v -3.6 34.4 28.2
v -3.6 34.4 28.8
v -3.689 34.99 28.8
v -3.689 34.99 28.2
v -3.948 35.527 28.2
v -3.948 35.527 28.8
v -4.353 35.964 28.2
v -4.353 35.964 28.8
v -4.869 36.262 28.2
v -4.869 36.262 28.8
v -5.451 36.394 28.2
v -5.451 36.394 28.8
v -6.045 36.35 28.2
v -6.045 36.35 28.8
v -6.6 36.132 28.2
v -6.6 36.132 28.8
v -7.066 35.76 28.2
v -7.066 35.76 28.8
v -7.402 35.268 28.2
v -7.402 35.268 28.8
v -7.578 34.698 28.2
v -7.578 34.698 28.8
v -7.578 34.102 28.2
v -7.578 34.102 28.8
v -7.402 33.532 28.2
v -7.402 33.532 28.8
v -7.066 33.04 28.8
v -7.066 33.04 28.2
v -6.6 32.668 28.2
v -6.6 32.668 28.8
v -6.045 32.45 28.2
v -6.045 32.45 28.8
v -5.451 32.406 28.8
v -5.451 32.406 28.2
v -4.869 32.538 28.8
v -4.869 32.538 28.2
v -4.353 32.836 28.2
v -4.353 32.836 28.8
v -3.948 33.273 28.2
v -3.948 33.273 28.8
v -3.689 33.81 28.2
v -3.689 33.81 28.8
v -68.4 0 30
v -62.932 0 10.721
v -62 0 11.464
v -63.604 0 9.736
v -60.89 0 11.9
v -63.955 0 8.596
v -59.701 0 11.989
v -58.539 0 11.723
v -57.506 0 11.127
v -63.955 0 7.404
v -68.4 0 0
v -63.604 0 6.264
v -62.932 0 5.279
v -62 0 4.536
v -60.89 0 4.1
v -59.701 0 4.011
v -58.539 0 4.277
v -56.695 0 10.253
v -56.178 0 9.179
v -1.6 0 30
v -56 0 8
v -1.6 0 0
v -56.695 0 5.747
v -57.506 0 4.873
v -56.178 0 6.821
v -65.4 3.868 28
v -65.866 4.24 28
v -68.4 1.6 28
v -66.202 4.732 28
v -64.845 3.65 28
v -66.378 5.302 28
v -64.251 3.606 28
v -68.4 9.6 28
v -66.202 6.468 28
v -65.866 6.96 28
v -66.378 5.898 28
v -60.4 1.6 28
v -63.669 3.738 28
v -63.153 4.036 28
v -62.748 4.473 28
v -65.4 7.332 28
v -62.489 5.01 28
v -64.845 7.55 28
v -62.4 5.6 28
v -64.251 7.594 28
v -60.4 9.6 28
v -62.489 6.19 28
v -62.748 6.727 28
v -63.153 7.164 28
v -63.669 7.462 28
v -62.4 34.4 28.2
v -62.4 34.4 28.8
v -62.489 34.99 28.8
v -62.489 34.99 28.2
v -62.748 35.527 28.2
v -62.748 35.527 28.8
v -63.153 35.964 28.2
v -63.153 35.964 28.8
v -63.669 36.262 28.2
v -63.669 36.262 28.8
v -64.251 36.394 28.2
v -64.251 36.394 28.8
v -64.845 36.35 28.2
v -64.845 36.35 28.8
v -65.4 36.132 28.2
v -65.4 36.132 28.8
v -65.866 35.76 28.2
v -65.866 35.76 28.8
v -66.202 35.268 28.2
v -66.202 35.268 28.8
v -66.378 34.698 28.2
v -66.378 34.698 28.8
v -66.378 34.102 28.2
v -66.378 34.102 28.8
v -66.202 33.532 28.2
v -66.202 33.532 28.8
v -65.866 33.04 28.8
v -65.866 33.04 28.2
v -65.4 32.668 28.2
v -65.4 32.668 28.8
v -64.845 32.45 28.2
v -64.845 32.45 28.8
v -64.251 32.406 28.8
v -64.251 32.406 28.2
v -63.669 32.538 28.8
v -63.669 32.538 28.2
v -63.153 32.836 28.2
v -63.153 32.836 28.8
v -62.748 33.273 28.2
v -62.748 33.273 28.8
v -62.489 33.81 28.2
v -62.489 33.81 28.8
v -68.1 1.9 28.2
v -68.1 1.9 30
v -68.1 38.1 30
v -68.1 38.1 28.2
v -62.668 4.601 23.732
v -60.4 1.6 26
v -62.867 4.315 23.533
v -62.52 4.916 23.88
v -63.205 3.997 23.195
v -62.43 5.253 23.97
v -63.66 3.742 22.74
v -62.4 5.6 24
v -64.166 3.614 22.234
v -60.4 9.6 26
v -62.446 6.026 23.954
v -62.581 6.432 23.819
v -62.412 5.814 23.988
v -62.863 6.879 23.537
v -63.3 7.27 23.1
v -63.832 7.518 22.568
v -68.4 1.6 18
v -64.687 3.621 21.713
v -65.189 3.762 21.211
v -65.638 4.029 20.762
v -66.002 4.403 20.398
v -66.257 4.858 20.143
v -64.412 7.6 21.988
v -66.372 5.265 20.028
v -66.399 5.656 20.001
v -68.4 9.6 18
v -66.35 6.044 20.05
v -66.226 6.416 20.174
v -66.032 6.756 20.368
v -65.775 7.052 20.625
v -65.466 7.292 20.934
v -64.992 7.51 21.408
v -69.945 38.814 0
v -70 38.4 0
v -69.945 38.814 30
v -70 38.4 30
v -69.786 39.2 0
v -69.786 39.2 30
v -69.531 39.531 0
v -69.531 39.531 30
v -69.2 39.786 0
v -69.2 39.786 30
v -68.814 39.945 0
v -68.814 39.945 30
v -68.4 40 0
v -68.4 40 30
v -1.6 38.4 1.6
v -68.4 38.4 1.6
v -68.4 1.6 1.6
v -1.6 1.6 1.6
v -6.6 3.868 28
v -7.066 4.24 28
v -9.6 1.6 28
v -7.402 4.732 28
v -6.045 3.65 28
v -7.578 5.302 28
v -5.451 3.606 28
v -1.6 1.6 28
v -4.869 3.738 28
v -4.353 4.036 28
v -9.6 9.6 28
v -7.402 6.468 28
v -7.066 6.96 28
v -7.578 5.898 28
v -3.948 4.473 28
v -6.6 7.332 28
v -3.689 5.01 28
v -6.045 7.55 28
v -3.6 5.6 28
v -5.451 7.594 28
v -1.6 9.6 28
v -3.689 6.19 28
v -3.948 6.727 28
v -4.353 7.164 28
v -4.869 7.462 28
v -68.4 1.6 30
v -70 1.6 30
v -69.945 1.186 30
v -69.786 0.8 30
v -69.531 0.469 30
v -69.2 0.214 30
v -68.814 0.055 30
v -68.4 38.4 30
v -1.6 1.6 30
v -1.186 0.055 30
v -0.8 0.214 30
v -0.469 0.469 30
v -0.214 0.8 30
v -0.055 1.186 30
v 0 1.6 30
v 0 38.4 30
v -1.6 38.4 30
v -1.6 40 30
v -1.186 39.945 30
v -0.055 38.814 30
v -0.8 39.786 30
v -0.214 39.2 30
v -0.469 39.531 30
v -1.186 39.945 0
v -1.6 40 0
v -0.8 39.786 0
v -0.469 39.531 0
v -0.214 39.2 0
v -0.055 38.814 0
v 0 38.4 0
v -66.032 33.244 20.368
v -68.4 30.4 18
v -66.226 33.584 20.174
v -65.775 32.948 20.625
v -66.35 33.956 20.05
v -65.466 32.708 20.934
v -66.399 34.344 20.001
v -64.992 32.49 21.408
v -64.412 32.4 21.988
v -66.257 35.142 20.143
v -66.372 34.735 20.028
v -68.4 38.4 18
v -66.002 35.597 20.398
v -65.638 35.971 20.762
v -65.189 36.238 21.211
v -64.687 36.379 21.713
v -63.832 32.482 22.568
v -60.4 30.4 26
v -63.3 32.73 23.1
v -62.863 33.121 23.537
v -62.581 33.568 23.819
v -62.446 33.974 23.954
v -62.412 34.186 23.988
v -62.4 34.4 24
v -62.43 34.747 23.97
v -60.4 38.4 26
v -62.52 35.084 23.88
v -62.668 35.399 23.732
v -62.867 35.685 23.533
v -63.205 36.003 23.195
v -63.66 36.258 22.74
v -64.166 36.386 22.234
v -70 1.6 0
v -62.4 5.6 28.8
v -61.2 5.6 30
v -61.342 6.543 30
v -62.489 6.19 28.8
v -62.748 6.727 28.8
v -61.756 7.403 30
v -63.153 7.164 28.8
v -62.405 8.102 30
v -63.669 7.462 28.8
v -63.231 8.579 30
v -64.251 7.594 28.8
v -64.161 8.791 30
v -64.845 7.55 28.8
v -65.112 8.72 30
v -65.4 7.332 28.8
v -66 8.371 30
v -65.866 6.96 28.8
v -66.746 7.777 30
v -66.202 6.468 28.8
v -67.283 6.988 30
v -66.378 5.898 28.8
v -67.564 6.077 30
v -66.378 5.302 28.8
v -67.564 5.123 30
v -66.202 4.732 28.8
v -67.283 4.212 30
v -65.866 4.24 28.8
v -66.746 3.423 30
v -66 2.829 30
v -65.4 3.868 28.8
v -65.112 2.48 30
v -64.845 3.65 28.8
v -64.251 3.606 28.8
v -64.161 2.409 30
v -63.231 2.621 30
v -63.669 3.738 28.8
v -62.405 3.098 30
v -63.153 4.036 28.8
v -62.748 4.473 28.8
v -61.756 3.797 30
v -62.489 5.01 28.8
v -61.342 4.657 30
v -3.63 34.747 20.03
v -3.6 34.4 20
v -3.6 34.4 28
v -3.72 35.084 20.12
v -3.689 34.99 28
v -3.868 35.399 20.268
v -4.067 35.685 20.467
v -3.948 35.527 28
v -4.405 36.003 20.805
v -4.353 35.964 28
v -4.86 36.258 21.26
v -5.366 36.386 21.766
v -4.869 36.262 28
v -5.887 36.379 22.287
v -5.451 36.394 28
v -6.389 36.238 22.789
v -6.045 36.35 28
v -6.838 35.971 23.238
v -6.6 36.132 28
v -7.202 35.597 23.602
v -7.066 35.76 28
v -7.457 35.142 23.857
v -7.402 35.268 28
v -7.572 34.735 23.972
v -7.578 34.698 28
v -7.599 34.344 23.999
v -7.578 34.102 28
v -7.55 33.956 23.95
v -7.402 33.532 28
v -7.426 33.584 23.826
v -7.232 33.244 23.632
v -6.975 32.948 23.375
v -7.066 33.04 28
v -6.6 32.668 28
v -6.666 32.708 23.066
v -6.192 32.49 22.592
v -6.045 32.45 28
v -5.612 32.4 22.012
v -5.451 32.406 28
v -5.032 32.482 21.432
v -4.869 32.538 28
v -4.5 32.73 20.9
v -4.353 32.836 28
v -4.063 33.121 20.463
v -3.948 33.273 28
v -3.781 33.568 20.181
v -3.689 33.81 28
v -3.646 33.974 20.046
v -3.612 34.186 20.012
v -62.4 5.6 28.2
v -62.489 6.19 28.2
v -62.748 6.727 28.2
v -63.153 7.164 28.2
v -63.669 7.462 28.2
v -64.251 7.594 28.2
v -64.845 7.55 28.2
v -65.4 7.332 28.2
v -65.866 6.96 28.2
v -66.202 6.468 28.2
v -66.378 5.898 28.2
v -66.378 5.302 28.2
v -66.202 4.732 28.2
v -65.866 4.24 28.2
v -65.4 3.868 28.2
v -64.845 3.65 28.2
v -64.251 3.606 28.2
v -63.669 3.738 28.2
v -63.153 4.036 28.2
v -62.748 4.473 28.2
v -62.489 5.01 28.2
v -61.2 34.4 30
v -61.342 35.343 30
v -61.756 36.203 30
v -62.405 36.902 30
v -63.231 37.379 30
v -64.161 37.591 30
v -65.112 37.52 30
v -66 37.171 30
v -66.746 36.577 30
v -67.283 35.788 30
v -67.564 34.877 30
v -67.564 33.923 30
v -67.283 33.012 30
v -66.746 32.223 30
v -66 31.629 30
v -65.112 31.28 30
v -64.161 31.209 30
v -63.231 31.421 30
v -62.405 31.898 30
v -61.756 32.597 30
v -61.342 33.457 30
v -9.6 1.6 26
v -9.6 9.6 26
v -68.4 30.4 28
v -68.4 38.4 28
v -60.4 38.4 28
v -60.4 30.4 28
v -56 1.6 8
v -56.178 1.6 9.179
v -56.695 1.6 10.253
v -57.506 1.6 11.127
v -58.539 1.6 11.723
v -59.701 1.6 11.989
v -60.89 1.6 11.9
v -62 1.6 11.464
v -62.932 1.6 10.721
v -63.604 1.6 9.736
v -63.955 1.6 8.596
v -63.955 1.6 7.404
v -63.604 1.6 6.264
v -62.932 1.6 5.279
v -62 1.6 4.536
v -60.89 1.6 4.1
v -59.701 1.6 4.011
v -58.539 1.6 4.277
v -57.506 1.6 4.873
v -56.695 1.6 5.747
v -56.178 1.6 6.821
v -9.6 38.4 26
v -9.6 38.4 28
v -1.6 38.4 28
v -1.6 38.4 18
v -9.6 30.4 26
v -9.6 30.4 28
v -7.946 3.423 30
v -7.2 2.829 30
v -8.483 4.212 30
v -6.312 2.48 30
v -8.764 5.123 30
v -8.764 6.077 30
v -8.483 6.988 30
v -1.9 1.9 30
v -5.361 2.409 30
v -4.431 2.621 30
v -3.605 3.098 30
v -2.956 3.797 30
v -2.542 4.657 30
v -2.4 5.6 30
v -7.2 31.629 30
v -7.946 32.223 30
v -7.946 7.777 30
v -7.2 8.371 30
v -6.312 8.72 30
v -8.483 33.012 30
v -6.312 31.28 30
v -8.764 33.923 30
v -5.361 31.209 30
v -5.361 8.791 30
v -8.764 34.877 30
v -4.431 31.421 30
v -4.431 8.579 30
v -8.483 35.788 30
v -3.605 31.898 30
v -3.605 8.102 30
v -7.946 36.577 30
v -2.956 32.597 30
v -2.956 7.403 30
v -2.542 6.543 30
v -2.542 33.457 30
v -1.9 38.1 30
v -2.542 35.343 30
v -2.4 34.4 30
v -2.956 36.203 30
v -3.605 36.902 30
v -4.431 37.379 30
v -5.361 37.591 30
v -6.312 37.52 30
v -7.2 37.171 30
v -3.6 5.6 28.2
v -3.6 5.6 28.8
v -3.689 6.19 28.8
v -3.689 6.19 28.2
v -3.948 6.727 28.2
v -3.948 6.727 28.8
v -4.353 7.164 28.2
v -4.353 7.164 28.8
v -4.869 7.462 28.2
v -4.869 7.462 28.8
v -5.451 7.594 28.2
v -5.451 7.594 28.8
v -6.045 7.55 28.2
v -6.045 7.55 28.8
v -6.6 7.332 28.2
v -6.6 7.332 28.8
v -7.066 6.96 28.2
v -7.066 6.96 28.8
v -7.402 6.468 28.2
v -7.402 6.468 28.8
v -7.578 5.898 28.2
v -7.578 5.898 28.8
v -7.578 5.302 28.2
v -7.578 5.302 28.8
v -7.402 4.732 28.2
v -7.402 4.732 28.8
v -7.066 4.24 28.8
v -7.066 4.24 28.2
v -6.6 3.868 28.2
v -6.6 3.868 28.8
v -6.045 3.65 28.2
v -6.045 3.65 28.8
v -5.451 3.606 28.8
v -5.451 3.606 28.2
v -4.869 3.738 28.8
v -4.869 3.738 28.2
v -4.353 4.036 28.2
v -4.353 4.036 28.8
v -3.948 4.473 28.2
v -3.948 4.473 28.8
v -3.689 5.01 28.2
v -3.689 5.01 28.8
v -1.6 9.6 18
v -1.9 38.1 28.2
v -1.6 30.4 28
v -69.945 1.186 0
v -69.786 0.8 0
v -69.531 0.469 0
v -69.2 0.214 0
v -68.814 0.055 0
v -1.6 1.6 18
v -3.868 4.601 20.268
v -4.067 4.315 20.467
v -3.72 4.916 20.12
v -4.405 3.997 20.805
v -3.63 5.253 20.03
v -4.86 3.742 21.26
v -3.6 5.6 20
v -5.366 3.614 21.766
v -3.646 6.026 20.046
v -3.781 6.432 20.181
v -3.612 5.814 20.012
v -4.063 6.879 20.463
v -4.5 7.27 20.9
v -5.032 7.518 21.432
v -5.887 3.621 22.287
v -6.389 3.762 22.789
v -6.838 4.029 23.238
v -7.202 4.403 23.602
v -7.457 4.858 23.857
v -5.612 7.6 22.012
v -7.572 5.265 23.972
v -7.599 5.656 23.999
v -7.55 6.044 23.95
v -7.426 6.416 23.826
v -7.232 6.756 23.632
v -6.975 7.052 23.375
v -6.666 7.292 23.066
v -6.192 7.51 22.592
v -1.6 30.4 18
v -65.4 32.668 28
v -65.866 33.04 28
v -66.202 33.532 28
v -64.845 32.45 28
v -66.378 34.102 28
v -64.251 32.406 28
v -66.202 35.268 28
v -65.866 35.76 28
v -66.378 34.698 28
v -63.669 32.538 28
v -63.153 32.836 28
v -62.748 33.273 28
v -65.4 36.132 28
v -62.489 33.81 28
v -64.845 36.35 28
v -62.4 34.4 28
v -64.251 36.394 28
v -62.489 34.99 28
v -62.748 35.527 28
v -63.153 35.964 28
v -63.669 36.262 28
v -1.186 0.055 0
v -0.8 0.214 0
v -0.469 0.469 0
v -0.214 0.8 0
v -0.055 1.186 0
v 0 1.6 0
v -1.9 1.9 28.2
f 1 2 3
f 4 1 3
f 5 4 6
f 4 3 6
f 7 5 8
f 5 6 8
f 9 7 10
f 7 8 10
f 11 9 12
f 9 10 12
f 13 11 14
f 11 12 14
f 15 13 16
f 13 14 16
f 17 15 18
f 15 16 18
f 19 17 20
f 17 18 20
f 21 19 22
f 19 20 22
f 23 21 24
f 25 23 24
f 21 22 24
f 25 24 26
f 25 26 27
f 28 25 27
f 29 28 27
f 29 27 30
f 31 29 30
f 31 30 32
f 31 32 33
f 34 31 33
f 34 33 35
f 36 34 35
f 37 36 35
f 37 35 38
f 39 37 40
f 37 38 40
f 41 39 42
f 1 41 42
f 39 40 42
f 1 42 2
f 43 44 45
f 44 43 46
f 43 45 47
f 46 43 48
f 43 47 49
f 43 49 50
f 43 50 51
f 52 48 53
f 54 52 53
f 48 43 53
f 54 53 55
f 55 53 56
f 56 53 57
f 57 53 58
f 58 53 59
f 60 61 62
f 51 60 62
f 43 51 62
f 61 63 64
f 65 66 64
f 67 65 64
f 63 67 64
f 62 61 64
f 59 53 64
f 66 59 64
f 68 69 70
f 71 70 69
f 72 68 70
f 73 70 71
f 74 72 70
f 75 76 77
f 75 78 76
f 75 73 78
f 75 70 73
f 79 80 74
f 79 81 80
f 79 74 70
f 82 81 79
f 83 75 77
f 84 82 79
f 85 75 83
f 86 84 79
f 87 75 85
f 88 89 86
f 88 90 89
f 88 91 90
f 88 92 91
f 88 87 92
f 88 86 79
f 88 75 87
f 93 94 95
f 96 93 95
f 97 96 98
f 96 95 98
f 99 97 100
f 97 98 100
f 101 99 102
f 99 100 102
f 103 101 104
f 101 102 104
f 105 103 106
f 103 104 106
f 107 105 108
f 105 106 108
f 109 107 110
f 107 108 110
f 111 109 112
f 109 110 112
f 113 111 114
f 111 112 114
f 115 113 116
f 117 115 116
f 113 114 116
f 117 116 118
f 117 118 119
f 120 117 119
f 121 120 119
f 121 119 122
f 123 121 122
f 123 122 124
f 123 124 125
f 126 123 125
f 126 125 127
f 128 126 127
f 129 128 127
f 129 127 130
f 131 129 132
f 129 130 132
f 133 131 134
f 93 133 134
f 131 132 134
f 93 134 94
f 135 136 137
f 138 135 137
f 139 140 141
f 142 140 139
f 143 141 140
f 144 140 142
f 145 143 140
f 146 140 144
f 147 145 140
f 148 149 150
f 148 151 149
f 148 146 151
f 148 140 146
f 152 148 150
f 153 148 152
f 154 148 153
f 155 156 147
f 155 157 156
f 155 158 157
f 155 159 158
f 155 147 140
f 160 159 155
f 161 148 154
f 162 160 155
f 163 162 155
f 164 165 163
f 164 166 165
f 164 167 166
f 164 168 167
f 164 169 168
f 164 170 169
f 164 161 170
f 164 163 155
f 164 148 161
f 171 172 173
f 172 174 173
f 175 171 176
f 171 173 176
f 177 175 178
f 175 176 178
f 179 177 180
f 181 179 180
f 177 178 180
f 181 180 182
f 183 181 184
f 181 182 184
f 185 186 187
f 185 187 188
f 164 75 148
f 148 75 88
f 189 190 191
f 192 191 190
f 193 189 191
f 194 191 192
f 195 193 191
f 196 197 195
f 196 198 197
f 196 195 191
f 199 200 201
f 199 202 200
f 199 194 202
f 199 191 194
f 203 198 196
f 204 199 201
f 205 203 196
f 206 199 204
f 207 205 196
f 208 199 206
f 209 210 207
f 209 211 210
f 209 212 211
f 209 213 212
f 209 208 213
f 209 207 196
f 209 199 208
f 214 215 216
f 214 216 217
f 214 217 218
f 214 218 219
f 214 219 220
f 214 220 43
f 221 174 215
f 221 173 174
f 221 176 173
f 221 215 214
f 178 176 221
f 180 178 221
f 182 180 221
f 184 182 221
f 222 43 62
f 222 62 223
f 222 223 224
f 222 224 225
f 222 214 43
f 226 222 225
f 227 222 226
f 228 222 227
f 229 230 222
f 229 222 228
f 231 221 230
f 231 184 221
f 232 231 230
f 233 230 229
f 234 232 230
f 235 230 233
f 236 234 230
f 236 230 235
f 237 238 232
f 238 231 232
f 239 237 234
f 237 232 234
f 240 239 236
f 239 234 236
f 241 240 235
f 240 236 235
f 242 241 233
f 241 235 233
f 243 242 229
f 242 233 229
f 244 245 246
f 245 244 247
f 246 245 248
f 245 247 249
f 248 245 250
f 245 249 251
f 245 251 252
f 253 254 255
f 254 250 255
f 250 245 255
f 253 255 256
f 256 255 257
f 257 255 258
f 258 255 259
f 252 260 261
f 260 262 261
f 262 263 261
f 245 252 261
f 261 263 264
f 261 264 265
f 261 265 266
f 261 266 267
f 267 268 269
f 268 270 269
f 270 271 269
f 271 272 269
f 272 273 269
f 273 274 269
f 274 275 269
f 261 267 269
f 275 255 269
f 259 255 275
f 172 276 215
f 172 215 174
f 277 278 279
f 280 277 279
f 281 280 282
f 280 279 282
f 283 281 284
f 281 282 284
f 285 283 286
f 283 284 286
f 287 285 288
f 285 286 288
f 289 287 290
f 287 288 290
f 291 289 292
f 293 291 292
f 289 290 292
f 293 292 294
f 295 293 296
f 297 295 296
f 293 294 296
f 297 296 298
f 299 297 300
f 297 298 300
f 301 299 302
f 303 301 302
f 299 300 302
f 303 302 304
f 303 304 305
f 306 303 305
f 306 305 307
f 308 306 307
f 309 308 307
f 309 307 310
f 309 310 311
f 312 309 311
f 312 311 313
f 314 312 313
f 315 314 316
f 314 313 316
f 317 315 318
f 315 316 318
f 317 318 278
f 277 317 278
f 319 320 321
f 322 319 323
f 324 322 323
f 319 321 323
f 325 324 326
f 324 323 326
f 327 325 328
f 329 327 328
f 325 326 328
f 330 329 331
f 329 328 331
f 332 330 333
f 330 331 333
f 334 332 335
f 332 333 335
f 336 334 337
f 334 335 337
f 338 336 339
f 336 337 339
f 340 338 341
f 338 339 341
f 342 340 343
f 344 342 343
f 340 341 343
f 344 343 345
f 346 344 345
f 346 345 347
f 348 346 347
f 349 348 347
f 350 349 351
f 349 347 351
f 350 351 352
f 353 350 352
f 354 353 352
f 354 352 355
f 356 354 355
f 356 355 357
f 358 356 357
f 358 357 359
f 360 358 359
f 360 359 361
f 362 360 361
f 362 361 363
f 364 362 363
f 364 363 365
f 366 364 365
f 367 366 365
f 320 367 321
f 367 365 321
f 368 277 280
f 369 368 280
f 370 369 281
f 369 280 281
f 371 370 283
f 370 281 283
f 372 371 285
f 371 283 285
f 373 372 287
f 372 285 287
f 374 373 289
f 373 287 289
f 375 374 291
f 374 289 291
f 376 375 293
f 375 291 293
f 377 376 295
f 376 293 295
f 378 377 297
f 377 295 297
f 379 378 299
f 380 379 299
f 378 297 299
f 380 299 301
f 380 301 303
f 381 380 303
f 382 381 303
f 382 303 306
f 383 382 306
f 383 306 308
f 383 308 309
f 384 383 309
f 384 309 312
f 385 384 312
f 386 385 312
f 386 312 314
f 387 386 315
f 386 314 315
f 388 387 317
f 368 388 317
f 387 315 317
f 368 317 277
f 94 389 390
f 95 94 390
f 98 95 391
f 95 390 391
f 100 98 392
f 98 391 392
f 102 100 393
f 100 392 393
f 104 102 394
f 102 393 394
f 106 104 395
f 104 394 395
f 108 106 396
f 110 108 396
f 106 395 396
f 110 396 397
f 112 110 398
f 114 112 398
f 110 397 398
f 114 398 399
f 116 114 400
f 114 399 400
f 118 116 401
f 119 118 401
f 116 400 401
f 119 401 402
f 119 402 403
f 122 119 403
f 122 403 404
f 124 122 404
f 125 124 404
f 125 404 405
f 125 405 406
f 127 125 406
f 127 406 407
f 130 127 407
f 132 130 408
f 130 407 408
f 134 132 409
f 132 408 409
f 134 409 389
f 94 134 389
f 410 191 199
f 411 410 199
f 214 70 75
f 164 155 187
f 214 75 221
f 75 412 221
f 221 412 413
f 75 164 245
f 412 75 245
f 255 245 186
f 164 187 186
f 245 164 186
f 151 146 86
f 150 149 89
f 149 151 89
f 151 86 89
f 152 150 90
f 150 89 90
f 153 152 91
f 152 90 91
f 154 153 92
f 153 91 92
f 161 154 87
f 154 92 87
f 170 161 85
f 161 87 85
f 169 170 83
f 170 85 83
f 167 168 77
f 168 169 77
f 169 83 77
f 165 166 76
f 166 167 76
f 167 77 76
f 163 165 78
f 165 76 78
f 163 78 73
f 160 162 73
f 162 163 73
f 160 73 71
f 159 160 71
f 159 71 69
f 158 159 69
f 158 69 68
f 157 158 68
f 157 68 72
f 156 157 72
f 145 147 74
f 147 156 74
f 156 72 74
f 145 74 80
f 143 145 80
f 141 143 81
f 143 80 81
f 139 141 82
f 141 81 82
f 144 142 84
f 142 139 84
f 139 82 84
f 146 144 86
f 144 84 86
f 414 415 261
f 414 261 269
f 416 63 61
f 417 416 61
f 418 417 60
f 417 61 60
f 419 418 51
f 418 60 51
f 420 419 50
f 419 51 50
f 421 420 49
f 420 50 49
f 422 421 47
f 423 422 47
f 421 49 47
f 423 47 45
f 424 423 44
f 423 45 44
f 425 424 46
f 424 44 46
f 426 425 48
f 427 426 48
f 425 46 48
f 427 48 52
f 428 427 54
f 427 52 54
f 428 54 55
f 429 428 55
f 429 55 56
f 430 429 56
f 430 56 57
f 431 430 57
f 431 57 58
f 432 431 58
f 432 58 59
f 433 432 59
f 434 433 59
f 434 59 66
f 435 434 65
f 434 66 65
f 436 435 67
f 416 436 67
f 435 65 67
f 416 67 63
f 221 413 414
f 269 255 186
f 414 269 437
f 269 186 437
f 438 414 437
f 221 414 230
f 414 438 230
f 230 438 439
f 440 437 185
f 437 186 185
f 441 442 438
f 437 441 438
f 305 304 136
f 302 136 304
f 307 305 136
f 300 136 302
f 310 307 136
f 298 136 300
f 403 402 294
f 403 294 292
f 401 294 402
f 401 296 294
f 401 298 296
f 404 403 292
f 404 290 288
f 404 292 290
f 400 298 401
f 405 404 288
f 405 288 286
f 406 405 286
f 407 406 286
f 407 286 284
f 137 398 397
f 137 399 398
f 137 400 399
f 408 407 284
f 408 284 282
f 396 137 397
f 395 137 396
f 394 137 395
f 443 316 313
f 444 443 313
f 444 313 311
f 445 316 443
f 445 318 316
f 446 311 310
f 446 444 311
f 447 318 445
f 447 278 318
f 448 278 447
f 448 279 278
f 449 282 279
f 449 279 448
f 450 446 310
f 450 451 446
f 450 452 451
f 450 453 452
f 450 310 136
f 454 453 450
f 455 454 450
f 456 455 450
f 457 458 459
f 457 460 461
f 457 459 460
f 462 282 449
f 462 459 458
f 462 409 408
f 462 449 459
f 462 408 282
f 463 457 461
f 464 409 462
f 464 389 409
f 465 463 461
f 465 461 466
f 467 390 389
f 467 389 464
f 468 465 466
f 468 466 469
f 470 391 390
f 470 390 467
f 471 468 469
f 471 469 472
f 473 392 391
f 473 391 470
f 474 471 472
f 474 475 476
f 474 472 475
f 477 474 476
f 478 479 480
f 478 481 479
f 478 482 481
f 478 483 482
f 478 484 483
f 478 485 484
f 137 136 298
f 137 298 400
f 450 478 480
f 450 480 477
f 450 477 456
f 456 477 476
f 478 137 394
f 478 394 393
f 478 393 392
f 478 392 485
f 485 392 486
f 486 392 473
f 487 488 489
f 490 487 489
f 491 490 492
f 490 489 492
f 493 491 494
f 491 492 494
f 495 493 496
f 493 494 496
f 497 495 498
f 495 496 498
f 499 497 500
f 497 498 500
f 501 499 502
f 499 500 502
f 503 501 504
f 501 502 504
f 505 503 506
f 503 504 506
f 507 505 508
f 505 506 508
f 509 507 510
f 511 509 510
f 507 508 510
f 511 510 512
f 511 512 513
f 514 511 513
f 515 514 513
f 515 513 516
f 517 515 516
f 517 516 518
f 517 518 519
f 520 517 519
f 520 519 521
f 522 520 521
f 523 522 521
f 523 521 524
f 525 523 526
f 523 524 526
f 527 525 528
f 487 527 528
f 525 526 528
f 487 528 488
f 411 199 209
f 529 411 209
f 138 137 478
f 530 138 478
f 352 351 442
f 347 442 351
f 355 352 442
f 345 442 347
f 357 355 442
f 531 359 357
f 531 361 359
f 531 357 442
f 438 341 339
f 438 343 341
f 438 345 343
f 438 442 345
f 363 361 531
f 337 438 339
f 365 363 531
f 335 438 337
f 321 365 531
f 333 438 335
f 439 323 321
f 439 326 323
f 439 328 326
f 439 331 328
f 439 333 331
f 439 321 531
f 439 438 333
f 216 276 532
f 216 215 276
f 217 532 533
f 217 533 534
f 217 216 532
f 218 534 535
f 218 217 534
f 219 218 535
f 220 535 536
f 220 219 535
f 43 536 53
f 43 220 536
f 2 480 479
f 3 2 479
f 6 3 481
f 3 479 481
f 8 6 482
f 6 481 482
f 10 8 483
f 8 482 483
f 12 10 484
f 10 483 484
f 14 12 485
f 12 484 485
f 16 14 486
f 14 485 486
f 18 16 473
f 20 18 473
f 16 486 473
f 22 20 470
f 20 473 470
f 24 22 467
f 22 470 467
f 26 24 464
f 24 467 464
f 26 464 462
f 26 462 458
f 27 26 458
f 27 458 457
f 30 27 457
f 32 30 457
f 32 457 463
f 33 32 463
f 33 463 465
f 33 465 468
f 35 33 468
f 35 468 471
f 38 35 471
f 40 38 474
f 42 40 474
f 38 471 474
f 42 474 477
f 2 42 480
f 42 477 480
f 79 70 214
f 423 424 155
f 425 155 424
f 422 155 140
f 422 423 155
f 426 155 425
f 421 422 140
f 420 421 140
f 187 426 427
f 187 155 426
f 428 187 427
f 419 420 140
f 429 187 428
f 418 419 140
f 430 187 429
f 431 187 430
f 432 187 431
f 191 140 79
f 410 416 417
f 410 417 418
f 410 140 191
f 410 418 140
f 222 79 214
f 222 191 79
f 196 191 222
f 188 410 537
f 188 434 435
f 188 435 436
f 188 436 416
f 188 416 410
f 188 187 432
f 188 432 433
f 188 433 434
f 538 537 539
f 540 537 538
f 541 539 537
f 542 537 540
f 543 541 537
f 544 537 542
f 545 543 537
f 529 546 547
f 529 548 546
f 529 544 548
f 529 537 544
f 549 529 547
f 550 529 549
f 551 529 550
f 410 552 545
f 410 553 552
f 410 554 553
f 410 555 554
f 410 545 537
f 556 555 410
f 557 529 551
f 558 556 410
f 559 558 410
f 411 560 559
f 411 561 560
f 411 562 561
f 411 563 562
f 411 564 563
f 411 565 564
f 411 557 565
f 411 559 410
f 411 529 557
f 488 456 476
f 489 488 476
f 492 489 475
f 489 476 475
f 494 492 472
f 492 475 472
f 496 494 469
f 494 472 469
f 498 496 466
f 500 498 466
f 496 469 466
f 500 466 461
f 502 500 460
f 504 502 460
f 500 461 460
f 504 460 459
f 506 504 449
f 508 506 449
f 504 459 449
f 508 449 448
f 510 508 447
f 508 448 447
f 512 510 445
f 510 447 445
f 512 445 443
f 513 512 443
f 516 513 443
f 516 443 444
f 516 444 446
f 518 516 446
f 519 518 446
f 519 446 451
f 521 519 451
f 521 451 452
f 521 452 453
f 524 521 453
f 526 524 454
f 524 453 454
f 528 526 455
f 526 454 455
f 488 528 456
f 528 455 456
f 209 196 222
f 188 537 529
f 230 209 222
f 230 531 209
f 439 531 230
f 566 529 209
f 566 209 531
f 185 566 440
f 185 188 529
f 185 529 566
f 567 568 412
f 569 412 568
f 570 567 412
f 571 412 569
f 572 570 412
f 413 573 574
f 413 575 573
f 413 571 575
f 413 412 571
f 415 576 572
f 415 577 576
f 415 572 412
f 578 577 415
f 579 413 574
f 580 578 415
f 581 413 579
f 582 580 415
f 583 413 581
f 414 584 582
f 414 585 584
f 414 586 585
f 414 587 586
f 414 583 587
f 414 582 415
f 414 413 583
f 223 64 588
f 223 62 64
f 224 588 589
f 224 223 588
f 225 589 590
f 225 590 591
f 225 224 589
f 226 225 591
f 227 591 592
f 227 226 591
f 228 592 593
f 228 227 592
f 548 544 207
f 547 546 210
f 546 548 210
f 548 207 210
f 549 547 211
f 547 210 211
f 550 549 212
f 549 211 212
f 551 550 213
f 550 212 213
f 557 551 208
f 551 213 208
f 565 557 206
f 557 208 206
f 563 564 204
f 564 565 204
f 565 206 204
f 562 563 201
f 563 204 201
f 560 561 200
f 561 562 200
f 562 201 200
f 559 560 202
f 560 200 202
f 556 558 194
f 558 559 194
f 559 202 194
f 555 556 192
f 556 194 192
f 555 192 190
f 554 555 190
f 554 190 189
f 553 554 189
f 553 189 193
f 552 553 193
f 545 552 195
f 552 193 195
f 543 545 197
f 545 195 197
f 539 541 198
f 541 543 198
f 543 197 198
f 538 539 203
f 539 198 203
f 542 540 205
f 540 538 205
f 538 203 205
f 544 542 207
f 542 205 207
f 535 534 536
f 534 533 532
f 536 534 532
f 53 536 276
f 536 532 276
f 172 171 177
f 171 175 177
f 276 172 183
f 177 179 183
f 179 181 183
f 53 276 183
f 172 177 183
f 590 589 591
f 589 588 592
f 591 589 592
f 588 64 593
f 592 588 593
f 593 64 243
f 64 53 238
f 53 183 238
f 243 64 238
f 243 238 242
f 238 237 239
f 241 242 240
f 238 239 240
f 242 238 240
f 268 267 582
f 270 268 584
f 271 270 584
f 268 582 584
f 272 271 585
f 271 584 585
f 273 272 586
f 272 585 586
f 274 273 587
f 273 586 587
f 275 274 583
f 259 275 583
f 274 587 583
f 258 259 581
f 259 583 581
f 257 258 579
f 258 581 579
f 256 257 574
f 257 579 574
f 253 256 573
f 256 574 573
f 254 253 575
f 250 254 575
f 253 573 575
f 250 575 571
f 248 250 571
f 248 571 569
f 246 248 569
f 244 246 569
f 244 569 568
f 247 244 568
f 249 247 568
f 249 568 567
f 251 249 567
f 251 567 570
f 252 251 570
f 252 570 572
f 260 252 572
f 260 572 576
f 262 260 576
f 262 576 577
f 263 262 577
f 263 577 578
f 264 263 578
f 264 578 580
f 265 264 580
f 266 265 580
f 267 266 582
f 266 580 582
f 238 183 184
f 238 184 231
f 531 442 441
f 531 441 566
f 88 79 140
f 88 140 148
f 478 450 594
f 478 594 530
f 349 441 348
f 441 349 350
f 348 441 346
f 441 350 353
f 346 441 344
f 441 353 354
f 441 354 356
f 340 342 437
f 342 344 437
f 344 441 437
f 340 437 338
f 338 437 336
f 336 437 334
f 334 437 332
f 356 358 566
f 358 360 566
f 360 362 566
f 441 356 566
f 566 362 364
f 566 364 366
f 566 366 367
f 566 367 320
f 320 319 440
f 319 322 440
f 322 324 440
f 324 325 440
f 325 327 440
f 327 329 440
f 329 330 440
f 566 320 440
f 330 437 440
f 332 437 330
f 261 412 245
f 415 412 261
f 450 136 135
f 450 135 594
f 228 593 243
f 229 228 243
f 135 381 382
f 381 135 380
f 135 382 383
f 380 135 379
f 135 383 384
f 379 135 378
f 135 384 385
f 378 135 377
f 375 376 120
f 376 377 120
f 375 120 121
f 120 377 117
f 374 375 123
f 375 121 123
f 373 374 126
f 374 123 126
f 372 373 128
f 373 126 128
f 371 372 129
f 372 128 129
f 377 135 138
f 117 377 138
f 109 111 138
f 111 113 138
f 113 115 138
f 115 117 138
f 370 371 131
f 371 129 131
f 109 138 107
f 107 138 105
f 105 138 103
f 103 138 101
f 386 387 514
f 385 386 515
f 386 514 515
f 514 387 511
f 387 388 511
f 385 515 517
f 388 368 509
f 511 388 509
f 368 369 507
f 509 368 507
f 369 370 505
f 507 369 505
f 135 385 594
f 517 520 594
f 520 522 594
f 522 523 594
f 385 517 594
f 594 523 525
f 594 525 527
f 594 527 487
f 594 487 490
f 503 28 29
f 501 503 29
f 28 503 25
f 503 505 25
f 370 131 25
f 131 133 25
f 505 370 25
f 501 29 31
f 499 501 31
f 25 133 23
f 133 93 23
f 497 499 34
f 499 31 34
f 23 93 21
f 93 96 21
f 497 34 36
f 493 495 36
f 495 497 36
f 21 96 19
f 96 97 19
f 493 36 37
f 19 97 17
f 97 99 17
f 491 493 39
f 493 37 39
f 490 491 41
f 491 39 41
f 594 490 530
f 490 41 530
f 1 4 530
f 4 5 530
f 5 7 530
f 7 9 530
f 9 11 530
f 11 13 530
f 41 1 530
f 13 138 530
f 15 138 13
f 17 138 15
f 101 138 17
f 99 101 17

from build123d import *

# Parameters (mm, degrees)
F0_W        = 70
F0_H        = 40
F1_DEPTH    = 30
F2_T        = -1.6
F4_W        = 8
F4_H        = 8
F4_R        = 2
F5_DEPTH    = 10
F6_T1_DEPTH = 28.5734639037
F6_T3_DEPTH = 28.5734639037
F7_R        = 4
F8_DEPTH    = 1.6
F9_W        = 66.2
F9_H        = 36.2
F9_R        = 2
F10_DEPTH   = 1.8
F11_SIZE    = 1.2
F12_R       = 1.6


# Not quite as in the source:
# - a fillet or chamfer that OpenCascade refuses, or shapes differently, is made with other operations: its cross-section is extruded or revolved along the edge and cut away or added


with BuildPart() as f1:
    # F0 (on Top) → F1 (new body)
    with BuildSketch(Plane.XY):
        with Locations((-35, 20)):
            Rectangle(F0_W, F0_H)
    extrude(amount=F1_DEPTH)

    # F2
    f2_openings = [f1.faces().sort_by_distance(p)[0] for p in [
        (-35, 20, 30),
    ]]
    offset(amount=F2_T, openings=f2_openings)

    # F4 (on offset) → F5 (join)
    with BuildSketch(Plane.XY.offset(28)):
        with Locations((-64.4, 34.4)):
            Rectangle(F4_W, F4_H)
        with Locations((-64.4, 34.4)):
            Circle(F4_R, mode=Mode.SUBTRACT)
        with Locations((-5.6, 34.4)):
            Rectangle(F4_W, F4_H)
        with Locations((-5.6, 34.4)):
            Circle(F4_R, mode=Mode.SUBTRACT)
        with Locations((-5.6, 5.6)):
            Rectangle(F4_W, F4_H)
        with Locations((-5.6, 5.6)):
            Circle(F4_R, mode=Mode.SUBTRACT)
        with Locations((-64.4, 5.6)):
            Rectangle(F4_W, F4_H)
        with Locations((-64.4, 5.6)):
            Circle(F4_R, mode=Mode.SUBTRACT)
    extrude(amount=-F5_DEPTH)

    # F6: chamfer of 8 on 4 edges, made by hand

    # F6_s2 → F6_t1 (cut)
    with BuildSketch(Plane.XZ.offset(-38.4)):
        Polygon((-68.4, 18), (-60.4, 26), (-60.4, 18), align=None)
        Polygon((-9.6, 26), (-1.6, 18), (-9.6, 18), align=None)
    extrude(amount=F6_T1_DEPTH, mode=Mode.SUBTRACT)

    # F6_s4 → F6_t3 (cut)
    with BuildSketch(Plane.XZ.offset(-30.1734639037)):
        Polygon((-60.4, 26), (-68.4, 18), (-60.4, 18), align=None)
        Polygon((-1.6, 18), (-9.6, 26), (-9.6, 18), align=None)
    extrude(amount=F6_T3_DEPTH, mode=Mode.SUBTRACT)

    # F7 (on face) → F8 (cut, through all)
    with BuildSketch(Plane.XZ):
        with Locations((-60, 8)):
            Circle(F7_R)
    extrude(amount=-F8_DEPTH, mode=Mode.SUBTRACT)

    # F12
    f12_edges = [f1.edges().sort_by_distance(p)[0] for p in [
        (-70, 0, 15),
        (0, 0, 15),
        (0, 40, 15),
        (-70, 40, 15),
    ]]
    fillet(f12_edges, radius=F12_R)


with BuildPart() as f10:
    # F9 (on face) → F10 (new body)
    with BuildSketch(Plane.XY.offset(30)):
        with Locations((-35, 20)):
            Rectangle(F9_W, F9_H)
        with Locations((-64.4, 5.6)):
            Circle(F9_R, mode=Mode.SUBTRACT)
        with Locations((-5.6, 5.6)):
            Circle(F9_R, mode=Mode.SUBTRACT)
        with Locations((-64.4, 34.4)):
            Circle(F9_R, mode=Mode.SUBTRACT)
        with Locations((-5.6, 34.4)):
            Circle(F9_R, mode=Mode.SUBTRACT)
    extrude(amount=-F10_DEPTH)

    # F11
    f11_edges = [f10.edges().sort_by_distance(p)[0] for p in [
        (-66.4, 34.4, 30),
        (-7.6, 34.4, 30),
        (-7.6, 5.6, 30),
        (-66.4, 5.6, 30),
    ]]
    chamfer(f11_edges, length=F11_SIZE)


solid = Compound([f1.part, f10.part])
